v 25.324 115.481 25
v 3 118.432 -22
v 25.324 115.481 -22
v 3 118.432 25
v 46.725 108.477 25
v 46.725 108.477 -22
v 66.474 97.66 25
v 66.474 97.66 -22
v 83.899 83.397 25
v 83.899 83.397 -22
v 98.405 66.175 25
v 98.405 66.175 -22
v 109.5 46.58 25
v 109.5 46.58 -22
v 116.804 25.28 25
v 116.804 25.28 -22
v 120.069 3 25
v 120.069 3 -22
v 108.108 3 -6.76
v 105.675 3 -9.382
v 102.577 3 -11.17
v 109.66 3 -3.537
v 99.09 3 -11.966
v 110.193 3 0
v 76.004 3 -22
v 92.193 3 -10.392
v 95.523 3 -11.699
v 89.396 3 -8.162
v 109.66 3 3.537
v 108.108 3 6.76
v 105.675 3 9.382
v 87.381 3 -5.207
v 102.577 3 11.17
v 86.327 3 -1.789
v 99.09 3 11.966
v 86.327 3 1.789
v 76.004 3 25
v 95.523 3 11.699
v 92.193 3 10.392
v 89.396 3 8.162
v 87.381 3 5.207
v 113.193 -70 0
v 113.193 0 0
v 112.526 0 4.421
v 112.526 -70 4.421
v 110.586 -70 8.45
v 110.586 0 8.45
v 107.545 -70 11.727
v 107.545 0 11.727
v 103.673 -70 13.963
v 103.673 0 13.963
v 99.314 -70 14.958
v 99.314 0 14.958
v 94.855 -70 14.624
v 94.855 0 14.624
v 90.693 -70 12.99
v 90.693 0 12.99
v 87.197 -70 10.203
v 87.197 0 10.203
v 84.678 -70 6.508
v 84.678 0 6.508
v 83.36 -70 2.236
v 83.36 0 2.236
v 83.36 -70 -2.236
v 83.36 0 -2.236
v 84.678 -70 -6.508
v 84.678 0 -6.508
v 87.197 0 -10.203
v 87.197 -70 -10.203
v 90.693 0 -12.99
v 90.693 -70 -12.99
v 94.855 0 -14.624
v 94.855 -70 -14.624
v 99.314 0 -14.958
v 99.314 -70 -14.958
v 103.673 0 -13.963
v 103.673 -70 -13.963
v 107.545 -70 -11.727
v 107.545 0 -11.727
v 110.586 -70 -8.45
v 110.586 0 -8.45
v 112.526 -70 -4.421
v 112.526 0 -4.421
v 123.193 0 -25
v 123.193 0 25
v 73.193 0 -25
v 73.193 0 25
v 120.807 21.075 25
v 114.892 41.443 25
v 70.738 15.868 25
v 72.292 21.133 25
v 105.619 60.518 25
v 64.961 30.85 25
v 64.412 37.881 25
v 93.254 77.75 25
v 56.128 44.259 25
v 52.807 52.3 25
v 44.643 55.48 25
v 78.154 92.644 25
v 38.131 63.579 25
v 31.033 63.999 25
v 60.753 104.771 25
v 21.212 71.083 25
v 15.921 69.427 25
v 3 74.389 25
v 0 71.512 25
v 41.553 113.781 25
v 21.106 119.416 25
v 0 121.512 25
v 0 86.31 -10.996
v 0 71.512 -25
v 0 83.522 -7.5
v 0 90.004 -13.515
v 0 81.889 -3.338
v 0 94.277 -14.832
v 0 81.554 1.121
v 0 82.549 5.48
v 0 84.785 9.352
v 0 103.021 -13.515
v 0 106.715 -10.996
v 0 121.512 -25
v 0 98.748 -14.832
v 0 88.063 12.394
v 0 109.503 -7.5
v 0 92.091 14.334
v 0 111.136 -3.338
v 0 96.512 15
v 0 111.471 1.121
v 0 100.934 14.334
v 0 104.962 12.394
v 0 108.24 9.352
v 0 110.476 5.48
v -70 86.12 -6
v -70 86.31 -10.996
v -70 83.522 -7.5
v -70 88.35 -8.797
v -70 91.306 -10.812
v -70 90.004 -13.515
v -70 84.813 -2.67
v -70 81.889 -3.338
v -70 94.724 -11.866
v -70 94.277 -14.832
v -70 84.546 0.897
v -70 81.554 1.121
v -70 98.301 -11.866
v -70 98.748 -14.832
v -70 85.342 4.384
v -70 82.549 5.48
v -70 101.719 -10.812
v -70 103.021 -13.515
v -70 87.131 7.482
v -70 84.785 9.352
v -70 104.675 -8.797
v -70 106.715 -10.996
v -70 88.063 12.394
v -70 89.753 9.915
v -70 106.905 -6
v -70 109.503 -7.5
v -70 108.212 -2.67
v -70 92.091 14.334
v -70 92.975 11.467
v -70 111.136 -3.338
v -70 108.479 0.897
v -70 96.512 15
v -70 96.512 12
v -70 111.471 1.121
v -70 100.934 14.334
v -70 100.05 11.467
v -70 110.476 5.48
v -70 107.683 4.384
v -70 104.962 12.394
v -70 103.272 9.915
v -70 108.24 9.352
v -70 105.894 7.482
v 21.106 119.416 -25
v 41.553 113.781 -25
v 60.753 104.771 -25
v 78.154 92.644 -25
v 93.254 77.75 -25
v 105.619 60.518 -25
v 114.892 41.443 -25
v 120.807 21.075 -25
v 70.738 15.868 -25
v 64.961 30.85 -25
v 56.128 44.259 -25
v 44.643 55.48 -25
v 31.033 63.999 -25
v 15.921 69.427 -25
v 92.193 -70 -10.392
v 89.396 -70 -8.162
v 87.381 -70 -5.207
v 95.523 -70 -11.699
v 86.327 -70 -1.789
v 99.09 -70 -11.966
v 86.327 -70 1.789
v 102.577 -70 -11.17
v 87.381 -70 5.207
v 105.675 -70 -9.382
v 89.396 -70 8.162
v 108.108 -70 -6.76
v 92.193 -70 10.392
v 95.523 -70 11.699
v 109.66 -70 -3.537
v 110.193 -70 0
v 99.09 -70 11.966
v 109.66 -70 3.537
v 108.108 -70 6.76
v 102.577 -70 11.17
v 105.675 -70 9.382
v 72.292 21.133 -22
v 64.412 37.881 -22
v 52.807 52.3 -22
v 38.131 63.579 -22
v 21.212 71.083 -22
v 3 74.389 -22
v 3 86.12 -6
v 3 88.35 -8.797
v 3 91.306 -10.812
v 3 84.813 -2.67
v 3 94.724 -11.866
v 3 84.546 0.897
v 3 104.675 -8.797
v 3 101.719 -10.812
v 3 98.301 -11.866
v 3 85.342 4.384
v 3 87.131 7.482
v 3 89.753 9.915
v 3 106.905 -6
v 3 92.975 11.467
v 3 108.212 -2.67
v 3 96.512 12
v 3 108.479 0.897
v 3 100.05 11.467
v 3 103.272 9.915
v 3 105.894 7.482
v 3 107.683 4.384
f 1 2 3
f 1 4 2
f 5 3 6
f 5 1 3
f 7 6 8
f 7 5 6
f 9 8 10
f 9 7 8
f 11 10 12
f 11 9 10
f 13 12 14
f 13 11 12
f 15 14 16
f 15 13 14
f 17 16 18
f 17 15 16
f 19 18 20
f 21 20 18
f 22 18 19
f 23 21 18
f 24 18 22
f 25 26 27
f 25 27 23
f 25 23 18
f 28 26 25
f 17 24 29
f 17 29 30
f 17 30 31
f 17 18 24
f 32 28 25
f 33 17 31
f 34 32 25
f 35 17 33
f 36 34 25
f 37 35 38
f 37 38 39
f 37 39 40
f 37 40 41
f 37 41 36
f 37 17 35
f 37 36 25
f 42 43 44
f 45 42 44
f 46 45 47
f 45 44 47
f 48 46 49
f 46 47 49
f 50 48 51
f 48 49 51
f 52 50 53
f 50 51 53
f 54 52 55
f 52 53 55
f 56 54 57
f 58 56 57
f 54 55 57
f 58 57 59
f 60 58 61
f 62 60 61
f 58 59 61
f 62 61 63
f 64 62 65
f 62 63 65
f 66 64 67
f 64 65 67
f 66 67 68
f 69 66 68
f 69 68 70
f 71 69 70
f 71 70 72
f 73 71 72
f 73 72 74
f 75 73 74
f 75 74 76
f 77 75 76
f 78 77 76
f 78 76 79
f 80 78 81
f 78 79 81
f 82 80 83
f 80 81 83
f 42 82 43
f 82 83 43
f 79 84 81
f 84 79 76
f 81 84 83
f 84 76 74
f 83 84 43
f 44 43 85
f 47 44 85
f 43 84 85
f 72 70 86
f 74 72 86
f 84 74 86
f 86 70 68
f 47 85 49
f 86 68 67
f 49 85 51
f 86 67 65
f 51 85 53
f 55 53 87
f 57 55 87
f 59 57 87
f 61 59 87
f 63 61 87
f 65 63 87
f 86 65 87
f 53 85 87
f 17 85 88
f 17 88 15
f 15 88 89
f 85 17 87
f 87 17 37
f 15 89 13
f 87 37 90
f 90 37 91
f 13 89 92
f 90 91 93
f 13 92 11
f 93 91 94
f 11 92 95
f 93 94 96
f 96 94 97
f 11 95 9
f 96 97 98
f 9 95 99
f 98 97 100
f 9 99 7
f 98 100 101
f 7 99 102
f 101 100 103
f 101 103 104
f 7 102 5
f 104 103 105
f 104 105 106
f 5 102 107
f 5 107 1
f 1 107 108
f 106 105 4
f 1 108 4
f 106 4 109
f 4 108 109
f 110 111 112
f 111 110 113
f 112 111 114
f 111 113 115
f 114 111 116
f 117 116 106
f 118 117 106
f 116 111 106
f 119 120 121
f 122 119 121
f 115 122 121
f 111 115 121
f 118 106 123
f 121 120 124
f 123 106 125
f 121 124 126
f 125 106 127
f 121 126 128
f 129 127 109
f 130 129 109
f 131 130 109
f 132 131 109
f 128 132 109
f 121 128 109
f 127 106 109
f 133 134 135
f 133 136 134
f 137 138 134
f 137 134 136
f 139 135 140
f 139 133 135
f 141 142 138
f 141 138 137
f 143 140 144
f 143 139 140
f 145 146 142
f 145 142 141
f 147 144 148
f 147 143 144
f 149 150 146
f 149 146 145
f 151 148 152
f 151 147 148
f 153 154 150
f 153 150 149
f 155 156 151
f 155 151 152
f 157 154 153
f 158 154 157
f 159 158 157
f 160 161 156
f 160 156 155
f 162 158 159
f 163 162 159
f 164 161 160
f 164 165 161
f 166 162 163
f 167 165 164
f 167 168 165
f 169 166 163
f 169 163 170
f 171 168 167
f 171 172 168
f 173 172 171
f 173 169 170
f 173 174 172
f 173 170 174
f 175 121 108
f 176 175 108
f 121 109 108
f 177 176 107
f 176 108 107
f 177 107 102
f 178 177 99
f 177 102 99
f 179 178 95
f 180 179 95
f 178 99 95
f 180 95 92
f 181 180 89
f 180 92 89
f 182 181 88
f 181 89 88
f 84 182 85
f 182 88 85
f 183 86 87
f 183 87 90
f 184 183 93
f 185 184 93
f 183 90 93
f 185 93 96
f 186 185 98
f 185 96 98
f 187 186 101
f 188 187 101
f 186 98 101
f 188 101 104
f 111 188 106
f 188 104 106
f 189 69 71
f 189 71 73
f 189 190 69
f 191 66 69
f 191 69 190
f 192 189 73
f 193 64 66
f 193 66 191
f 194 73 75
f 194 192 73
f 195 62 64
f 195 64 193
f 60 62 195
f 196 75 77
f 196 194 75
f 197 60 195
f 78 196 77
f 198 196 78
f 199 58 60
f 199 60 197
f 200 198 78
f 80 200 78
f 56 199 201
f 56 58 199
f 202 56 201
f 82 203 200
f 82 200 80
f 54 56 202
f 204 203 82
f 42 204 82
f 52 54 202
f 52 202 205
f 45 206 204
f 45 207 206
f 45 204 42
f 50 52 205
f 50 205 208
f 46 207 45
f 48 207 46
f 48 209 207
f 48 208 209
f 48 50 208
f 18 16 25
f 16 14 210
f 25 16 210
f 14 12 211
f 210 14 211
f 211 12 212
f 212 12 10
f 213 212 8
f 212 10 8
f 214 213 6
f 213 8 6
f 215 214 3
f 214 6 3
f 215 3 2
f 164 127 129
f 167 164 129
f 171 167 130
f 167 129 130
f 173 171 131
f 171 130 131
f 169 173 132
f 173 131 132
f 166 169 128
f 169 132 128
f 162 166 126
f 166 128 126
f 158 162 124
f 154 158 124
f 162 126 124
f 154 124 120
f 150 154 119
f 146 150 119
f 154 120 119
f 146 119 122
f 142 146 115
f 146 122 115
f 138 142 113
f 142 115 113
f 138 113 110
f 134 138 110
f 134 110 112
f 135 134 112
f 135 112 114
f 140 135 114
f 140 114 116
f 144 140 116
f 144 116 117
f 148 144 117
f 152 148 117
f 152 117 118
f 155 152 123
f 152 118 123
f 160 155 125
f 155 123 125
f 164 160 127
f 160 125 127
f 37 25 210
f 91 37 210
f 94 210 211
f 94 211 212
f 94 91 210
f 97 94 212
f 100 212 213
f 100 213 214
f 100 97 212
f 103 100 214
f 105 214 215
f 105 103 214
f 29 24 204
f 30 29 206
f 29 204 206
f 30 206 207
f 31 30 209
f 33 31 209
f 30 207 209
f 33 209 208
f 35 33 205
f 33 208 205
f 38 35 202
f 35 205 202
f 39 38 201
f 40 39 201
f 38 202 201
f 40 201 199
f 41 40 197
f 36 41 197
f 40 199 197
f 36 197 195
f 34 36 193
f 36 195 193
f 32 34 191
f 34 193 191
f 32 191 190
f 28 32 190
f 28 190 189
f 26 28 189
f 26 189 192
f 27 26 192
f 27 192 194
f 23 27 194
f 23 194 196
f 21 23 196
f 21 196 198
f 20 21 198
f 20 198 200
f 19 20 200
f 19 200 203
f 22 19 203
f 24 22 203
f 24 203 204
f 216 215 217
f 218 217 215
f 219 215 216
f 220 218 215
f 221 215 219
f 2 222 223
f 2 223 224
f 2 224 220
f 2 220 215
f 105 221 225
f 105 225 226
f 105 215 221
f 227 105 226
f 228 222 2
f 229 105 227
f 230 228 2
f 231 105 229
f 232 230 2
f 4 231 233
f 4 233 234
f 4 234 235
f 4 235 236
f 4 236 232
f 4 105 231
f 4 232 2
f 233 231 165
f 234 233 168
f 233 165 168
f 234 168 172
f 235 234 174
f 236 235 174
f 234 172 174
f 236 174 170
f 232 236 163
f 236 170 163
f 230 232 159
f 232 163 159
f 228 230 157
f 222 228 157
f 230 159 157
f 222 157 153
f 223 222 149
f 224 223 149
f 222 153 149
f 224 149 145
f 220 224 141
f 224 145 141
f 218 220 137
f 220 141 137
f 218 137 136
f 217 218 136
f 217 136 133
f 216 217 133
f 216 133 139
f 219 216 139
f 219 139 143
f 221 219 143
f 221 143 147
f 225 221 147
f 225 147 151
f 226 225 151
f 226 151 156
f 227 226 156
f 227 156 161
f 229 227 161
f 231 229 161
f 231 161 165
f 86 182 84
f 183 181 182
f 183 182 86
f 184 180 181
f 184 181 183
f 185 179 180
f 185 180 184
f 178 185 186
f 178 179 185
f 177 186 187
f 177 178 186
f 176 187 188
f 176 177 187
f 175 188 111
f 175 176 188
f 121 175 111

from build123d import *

# Parameters (mm, degrees)
BOSS_EXTRUDE1_DEPTH = 25
SHELL1_T            = -3
SKETCH2_R           = 15
BOSS_EXTRUDE2_DEPTH = 70
SKETCH3_R           = 12
CUT_EXTRUDE1_DEPTH  = 75
SKETCH4_R           = 15
BOSS_EXTRUDE3_DEPTH = 70
SKETCH5_R           = 12
CUT_EXTRUDE2_DEPTH  = 75


with BuildPart() as part:
    # Sketch1 → Boss-Extrude1 (new body, symmetric)
    with BuildSketch(Plane.XY):
        with BuildLine():
            Line((0, 71.51248035), (0, 121.51248035))
            ThreePointArc((0, 121.51248035), (86.020520014, 85.518075871), (123.192898424, 0))
            Line((123.192898424, 0), (73.192898424, 0))
            ThreePointArc((73.192898424, 0), (50.686723581, 50.177611321), (0, 71.51248035))
        make_face()
    extrude(amount=BOSS_EXTRUDE1_DEPTH, both=True)

    # Shell1
    shell1_openings = [part.faces().sort_by_distance(p)[0] for p in [
        (58.725035505, 58.052041885, 25),
    ]]
    offset(amount=SHELL1_T, openings=shell1_openings, kind=Kind.INTERSECTION)

    # Sketch2 → Boss-Extrude2 (add)
    with BuildSketch(Plane.ZY):
        with Locations((0, 96.51248035)):
            Circle(SKETCH2_R)
    extrude(amount=BOSS_EXTRUDE2_DEPTH)

    # Sketch3 → Cut-Extrude1 (cut)
    with BuildSketch(Plane.ZY.offset(70)):
        with Locations((0, 96.51248035)):
            Circle(SKETCH3_R)
    extrude(amount=-CUT_EXTRUDE1_DEPTH, mode=Mode.SUBTRACT)

    # Sketch4 → Boss-Extrude3 (add)
    with BuildSketch(Plane.XZ):
        with Locations((98.192898424, 0)):
            Circle(SKETCH4_R)
    extrude(amount=BOSS_EXTRUDE3_DEPTH)

    # Sketch5 → Cut-Extrude2 (cut)
    with BuildSketch(Plane.XZ.offset(70)):
        with Locations((98.192898424, 0)):
            Circle(SKETCH5_R)
    extrude(amount=-CUT_EXTRUDE2_DEPTH, mode=Mode.SUBTRACT)


solid = part.part
